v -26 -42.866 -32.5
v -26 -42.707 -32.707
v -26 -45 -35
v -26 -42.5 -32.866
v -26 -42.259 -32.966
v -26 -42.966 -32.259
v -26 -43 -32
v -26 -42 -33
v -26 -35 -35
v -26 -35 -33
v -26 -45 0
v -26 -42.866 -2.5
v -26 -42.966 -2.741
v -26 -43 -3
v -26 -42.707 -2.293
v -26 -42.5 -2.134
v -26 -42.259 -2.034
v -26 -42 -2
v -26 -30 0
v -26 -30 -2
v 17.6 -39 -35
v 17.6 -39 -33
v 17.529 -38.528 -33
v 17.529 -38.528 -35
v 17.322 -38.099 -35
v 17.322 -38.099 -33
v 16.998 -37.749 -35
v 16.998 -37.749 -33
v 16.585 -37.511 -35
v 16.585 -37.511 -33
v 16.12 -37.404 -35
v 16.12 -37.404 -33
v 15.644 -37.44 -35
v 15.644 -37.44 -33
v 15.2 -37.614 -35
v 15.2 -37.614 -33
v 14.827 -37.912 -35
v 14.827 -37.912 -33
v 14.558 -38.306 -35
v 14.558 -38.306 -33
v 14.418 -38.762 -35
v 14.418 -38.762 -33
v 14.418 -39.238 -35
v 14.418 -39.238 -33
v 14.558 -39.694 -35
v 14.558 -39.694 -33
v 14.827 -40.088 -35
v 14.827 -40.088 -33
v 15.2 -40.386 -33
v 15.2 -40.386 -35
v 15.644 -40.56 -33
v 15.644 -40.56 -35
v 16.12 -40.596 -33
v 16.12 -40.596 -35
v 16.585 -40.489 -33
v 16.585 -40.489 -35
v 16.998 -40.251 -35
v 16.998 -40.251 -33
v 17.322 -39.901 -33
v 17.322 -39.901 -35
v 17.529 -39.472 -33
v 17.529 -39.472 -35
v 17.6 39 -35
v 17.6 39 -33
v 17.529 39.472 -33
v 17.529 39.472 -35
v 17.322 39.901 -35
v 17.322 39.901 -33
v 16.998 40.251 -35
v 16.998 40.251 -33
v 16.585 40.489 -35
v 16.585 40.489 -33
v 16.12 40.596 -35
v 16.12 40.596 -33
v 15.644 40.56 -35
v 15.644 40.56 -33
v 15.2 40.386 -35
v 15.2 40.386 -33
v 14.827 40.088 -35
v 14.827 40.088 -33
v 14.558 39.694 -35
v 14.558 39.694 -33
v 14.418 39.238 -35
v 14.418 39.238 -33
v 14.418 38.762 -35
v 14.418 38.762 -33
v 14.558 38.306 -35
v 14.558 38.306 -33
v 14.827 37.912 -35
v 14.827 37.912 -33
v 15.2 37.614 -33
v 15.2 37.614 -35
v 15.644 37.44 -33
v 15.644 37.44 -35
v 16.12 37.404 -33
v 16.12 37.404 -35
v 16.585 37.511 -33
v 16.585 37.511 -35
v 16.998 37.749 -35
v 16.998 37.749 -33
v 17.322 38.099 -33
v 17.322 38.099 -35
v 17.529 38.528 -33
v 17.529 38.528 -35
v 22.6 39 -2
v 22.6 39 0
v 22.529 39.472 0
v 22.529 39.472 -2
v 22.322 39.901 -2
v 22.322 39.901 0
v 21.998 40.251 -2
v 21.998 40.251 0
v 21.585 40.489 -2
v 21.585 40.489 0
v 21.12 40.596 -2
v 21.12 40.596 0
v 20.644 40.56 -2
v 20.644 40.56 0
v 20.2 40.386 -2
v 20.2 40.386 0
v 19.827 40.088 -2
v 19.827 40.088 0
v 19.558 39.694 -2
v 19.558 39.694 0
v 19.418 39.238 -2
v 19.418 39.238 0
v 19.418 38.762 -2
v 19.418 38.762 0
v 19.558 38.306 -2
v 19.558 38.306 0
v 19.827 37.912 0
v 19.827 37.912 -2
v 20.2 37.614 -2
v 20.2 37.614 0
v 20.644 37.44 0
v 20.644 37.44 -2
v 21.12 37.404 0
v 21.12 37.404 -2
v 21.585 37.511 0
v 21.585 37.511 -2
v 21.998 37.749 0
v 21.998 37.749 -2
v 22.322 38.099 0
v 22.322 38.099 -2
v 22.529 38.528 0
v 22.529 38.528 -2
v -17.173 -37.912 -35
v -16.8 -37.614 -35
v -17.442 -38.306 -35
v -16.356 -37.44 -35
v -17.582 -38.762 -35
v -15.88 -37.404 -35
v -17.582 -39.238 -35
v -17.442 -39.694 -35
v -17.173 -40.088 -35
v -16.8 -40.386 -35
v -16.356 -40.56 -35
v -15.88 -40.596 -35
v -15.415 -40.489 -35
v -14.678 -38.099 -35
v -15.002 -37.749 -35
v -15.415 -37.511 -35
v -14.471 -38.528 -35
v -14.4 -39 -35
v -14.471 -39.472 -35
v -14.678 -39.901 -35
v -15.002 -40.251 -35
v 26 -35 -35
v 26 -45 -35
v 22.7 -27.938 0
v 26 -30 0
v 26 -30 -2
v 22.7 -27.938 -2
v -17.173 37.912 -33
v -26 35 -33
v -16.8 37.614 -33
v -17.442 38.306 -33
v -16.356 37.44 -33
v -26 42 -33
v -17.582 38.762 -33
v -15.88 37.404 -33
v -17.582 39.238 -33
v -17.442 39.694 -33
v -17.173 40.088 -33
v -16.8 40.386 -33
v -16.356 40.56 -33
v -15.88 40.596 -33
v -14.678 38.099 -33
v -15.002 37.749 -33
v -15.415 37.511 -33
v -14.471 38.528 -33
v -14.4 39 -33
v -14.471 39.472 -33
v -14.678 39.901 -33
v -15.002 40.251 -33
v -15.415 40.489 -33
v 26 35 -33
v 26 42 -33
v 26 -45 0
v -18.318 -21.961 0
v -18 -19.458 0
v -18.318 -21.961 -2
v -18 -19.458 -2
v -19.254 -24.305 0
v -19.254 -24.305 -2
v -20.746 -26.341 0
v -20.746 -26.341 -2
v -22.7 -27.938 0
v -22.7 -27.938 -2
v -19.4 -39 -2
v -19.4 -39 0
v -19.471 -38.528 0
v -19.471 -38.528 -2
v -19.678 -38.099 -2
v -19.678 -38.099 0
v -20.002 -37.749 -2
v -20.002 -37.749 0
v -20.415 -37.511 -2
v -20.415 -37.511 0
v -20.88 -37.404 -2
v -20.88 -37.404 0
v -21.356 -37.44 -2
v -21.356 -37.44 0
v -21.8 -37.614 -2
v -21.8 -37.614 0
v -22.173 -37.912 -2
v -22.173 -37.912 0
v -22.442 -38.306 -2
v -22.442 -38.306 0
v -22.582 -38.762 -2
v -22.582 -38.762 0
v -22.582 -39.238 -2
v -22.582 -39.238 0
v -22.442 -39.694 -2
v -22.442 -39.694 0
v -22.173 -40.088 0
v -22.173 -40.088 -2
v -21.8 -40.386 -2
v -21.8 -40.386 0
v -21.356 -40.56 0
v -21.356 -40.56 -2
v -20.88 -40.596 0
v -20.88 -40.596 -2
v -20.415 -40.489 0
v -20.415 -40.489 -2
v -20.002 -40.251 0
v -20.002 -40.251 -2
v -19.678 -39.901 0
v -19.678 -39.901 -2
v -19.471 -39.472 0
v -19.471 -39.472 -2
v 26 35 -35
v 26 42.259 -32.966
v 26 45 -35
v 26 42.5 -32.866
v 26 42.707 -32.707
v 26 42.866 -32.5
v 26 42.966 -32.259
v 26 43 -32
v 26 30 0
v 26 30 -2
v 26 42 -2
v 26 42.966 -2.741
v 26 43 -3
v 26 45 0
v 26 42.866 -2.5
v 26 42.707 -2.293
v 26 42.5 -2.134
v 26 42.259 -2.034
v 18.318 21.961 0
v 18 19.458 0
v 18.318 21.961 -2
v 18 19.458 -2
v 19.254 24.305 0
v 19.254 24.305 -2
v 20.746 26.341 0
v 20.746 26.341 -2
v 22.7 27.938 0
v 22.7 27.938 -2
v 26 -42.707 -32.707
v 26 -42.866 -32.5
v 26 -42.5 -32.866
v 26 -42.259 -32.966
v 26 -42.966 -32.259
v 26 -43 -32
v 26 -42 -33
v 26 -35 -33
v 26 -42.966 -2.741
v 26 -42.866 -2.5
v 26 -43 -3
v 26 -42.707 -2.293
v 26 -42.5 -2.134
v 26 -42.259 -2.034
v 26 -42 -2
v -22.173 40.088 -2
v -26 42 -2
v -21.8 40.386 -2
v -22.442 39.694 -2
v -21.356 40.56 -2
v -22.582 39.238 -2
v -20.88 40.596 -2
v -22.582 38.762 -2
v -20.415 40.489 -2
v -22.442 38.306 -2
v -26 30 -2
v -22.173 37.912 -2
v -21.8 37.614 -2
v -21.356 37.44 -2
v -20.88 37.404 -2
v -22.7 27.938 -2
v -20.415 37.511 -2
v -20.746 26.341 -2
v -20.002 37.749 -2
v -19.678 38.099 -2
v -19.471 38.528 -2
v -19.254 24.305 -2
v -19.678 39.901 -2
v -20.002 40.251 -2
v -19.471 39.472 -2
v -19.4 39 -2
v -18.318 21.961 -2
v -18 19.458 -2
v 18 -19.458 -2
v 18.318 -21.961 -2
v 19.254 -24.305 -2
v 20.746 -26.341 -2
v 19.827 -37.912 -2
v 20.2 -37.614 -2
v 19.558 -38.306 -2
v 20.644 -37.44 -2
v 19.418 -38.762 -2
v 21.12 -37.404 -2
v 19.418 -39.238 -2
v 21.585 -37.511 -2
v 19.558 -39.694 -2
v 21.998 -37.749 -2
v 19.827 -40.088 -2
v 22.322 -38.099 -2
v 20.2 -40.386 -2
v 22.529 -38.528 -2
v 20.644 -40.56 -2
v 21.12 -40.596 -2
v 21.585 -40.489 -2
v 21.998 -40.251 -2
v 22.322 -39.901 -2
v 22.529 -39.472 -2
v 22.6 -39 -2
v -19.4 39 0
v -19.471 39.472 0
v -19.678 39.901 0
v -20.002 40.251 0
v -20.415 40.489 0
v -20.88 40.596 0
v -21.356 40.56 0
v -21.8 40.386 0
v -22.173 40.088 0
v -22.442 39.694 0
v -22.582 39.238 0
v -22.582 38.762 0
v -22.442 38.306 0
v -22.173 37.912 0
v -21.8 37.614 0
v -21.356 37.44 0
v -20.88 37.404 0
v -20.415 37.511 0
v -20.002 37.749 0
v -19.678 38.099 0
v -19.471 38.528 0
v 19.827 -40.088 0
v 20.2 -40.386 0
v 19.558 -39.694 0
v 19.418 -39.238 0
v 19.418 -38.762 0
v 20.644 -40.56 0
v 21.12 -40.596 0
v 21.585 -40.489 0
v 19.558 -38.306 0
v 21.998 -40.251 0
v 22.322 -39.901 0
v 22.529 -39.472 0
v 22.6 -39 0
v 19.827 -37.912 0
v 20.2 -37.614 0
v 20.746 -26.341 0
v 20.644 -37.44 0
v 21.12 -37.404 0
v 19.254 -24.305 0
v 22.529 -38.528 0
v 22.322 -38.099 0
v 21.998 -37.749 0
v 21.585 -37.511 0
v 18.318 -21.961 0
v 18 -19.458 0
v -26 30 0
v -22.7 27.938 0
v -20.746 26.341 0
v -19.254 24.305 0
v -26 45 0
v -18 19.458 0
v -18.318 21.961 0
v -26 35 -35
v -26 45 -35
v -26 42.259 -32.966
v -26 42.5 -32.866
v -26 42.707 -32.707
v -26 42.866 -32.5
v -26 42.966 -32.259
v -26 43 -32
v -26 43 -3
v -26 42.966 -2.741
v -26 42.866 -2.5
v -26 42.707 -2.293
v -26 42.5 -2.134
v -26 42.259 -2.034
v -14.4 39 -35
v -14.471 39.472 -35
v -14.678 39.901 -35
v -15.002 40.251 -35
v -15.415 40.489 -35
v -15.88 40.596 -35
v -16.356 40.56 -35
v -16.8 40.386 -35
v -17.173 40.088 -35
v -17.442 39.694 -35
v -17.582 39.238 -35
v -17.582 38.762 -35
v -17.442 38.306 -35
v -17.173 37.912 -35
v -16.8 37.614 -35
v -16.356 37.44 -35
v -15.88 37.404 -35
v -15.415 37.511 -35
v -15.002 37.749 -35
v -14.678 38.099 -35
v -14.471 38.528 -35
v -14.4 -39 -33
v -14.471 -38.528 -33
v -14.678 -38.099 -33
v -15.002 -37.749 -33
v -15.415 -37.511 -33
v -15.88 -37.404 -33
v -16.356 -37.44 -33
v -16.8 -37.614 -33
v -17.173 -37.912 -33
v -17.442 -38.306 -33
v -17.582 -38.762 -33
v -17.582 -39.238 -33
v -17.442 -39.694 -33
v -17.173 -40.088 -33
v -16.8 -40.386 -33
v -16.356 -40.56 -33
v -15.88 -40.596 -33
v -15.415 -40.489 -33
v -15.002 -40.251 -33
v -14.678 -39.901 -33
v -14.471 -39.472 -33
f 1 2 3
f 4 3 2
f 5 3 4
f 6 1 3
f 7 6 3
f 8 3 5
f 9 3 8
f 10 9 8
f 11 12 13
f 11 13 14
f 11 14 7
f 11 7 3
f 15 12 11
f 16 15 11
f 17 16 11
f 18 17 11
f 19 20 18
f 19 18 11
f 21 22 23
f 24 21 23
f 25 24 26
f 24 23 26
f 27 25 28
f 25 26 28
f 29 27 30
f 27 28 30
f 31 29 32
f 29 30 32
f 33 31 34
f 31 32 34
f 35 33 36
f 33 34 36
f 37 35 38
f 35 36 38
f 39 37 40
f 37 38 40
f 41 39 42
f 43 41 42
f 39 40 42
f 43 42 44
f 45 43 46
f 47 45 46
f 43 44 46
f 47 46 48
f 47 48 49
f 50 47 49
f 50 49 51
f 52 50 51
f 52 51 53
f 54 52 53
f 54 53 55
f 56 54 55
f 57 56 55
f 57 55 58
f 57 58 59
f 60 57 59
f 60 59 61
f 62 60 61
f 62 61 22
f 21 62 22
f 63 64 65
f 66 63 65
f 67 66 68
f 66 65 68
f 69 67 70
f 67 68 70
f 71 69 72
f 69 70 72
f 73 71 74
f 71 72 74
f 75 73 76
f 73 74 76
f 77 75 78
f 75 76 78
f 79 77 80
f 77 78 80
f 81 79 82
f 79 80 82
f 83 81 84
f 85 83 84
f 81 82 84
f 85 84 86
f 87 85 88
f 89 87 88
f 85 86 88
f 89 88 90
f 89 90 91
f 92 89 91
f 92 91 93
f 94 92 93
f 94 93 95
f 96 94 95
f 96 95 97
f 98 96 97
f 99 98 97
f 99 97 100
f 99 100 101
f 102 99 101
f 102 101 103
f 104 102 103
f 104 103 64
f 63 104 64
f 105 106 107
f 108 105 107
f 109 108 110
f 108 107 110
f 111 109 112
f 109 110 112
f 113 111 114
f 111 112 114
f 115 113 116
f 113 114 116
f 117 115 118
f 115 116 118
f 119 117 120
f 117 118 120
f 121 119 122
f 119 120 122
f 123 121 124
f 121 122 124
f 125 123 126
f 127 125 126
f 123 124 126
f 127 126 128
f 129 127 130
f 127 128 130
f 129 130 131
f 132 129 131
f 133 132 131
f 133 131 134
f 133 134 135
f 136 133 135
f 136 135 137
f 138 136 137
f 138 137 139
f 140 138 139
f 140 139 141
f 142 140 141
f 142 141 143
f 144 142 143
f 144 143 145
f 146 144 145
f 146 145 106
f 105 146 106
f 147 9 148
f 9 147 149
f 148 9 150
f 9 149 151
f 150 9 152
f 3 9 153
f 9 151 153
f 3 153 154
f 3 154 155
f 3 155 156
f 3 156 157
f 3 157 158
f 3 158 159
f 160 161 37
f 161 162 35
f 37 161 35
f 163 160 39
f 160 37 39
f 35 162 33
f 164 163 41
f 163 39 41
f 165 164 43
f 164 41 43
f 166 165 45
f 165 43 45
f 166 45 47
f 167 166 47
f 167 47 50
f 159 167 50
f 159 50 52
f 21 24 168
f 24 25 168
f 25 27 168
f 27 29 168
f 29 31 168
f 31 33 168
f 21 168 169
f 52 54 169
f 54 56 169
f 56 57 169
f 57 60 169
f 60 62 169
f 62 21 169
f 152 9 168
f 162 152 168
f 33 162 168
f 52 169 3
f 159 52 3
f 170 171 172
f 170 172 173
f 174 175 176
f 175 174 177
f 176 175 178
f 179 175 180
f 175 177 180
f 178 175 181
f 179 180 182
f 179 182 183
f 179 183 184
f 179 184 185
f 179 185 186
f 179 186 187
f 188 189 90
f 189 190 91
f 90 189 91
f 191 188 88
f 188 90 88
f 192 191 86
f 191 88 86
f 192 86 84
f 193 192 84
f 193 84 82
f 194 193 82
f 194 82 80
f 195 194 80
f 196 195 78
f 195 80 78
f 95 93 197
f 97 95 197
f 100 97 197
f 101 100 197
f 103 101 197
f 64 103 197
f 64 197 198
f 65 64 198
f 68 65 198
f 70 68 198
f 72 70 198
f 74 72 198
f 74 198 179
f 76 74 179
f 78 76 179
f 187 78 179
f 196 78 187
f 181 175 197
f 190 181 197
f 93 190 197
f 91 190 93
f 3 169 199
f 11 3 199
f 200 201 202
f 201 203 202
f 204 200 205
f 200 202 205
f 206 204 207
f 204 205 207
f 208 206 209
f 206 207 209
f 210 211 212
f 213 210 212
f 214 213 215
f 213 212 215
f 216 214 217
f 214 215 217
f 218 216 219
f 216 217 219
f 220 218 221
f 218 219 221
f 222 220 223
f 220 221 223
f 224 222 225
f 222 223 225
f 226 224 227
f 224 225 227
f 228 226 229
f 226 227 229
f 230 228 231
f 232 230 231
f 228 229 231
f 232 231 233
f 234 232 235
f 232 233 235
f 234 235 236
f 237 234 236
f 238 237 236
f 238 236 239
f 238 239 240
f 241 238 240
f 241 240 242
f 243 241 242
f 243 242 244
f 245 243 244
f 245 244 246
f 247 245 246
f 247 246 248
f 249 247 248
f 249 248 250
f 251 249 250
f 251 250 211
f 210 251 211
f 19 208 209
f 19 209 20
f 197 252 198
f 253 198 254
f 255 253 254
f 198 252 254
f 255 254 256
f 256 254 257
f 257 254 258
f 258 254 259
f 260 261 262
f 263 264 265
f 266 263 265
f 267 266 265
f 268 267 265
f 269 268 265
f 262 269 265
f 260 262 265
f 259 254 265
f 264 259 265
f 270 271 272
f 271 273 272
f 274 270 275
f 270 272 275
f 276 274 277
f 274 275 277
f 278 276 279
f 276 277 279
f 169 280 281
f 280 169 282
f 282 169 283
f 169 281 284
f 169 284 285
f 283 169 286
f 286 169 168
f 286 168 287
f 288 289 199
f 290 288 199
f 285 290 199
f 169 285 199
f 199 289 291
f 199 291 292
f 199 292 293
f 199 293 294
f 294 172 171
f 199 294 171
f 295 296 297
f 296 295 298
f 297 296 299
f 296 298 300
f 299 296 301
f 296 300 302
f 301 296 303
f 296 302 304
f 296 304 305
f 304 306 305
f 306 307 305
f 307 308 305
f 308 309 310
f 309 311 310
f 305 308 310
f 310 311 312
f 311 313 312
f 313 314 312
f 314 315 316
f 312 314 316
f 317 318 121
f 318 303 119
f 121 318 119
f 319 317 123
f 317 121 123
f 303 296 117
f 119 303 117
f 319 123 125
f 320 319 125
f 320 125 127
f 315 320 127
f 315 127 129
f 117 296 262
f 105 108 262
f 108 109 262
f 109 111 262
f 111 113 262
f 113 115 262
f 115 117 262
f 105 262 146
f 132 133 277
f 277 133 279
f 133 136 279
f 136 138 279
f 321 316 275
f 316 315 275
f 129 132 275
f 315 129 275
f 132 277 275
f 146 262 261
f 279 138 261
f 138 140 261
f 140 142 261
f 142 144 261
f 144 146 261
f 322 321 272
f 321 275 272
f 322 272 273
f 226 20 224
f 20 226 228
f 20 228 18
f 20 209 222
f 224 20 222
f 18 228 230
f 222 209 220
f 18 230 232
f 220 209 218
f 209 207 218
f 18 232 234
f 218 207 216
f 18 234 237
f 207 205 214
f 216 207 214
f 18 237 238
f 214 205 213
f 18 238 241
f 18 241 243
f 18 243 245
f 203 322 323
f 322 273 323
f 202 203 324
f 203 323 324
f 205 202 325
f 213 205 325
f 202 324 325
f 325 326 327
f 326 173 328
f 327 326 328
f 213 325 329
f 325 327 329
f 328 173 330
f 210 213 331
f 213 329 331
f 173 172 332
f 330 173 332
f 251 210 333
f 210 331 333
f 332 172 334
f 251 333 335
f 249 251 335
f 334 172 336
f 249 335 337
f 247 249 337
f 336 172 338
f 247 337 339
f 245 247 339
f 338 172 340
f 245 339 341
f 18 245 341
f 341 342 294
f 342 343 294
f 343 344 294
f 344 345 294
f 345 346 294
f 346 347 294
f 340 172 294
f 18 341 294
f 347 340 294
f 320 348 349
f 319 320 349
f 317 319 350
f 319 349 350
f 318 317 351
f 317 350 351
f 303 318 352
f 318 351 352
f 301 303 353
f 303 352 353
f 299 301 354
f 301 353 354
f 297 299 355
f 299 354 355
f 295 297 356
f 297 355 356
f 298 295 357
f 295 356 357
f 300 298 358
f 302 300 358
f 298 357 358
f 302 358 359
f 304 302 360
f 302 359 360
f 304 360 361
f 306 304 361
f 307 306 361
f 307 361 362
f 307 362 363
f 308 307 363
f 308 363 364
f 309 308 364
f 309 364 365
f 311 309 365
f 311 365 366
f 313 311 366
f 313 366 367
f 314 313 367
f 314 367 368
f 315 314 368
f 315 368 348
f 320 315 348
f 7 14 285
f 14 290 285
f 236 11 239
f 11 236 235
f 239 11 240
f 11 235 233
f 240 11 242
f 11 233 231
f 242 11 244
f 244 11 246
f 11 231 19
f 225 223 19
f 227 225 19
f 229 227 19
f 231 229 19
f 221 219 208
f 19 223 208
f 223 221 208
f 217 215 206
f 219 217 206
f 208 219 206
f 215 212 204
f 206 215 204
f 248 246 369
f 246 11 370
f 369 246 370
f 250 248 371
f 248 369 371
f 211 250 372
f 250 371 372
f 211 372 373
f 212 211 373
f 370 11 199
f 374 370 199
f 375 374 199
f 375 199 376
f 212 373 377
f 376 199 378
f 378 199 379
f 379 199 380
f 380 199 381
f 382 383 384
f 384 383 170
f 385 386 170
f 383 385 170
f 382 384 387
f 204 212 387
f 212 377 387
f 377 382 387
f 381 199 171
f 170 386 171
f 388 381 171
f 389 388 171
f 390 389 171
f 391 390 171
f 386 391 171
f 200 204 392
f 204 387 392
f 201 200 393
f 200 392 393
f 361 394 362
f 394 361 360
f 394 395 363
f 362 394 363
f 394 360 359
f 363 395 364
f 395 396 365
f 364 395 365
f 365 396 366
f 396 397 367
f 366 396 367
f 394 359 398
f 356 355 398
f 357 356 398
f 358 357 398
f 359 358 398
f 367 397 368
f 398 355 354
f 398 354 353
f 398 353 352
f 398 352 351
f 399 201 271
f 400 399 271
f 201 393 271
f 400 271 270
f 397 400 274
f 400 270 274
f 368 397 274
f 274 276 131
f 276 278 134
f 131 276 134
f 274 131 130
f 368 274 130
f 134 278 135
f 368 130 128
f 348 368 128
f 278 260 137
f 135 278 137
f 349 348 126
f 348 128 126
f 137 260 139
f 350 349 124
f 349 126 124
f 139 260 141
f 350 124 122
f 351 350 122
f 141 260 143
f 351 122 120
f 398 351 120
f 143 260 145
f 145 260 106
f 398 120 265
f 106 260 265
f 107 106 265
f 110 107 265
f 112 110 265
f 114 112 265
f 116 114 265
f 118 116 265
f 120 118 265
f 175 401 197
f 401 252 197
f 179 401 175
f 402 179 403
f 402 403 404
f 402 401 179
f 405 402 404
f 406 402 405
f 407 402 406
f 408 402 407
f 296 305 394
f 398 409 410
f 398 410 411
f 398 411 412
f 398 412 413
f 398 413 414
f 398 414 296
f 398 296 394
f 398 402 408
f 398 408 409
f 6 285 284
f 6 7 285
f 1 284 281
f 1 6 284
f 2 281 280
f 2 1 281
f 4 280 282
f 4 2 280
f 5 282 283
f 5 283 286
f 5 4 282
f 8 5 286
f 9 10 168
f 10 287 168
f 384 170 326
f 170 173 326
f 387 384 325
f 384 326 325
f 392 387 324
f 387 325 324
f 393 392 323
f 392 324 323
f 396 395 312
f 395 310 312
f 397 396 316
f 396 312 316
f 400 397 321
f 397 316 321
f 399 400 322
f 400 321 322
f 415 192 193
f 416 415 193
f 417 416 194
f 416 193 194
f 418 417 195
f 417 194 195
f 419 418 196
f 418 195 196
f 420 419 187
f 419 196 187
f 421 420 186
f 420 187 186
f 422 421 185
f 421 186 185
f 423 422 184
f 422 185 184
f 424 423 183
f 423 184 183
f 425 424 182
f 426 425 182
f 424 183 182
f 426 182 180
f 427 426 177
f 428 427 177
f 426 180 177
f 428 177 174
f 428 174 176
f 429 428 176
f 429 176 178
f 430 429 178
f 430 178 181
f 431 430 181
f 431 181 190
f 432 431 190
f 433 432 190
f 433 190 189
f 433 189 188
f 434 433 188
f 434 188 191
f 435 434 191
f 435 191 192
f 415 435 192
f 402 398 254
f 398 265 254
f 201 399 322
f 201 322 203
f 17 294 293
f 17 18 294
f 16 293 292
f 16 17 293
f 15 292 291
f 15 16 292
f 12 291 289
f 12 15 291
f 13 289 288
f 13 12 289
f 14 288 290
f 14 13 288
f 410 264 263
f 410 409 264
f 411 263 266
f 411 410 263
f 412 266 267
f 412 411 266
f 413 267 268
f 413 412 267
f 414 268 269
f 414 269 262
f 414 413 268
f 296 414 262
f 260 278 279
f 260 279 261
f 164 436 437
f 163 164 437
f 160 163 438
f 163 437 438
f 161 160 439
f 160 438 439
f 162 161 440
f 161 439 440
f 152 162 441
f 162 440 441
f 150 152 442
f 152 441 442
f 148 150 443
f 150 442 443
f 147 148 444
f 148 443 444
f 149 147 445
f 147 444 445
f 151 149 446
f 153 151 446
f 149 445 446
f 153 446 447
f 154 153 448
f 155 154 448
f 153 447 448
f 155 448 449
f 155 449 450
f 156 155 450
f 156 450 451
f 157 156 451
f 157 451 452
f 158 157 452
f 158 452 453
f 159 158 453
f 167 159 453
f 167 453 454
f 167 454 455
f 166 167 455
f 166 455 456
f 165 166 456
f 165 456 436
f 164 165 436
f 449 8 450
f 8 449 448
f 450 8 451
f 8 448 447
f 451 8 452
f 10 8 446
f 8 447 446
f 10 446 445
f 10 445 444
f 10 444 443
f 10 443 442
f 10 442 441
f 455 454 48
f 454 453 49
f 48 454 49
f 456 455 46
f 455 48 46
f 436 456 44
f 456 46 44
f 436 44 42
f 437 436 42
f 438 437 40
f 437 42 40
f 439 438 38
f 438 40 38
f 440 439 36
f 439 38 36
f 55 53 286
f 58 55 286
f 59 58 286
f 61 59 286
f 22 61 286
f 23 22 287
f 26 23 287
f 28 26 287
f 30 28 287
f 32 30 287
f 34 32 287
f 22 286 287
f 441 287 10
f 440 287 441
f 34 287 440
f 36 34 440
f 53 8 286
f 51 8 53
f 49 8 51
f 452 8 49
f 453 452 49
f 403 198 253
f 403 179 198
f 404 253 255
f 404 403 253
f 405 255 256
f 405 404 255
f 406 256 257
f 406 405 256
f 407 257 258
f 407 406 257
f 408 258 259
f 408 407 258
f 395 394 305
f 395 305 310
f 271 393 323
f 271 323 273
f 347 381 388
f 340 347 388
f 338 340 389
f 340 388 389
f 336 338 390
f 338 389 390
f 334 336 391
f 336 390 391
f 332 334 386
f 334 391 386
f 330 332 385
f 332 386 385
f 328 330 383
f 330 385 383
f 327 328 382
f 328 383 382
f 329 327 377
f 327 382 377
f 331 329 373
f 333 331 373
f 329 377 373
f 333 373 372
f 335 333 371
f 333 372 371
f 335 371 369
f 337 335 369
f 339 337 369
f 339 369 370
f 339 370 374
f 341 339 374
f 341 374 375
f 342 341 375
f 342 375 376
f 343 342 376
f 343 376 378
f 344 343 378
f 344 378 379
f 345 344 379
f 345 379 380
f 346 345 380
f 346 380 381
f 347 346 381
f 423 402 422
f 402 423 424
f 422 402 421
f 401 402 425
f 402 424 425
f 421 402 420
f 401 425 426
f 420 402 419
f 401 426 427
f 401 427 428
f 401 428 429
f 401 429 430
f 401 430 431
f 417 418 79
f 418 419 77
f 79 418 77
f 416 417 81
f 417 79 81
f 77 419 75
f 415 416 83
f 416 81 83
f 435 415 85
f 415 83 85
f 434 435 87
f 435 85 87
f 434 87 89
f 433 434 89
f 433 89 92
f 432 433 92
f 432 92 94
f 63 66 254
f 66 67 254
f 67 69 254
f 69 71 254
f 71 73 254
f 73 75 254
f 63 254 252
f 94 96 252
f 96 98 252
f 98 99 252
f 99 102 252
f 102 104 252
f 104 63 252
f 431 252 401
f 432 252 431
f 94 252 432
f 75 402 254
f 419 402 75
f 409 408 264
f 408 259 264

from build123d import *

# Parameters (mm, degrees)
BOSS_EXTRUDE1_DEPTH = 26
CUT_EXTRUDE1_REACH  = 64.658
SKETCH2_R           = 1.6
CUT_EXTRUDE5_REACH  = 63.563
SKETCH6_R           = 1.6
FILLET1_R           = 1
CUT_EXTRUDE6_REACH  = 64.658
FILLET2_R           = 10


with BuildPart() as part:
    # Sketch1 → Boss-Extrude1 (new, symmetric)
    with BuildSketch(Plane(origin=(0, 0, 0), x_dir=(0, 0, -1), z_dir=(1, 0, 0))):
        Polygon((0, -45), (0, 45), (35, 45), (35, 35), (33, 35), (33, 43), (2, 43), (2, -43), (33, -43), (33, -35), (35, -35), (35, -45), align=None)
    extrude(amount=BOSS_EXTRUDE1_DEPTH, both=True)

    # Sketch2 → Cut-Extrude1 (cut, up to next)
    with BuildSketch(Plane.XY, mode=Mode.PRIVATE) as cut_extrude1_sk1:
        with Locations((-21, -39)):
            Circle(SKETCH2_R)
    cut_extrude1_tool1 = extrude(cut_extrude1_sk1.sketch, amount=-CUT_EXTRUDE1_REACH, mode=Mode.PRIVATE) & part.part
    # Sketch2 → Cut-Extrude1 (cut, up to next)
    with BuildSketch(Plane.XY, mode=Mode.PRIVATE) as cut_extrude1_sk2:
        with Locations((-21, 39)):
            Circle(SKETCH2_R)
    cut_extrude1_tool2 = extrude(cut_extrude1_sk2.sketch, amount=-CUT_EXTRUDE1_REACH, mode=Mode.PRIVATE) & part.part
    # Sketch2 → Cut-Extrude1 (cut, up to next)
    with BuildSketch(Plane.XY, mode=Mode.PRIVATE) as cut_extrude1_sk3:
        with Locations((21, 39)):
            Circle(SKETCH2_R)
    cut_extrude1_tool3 = extrude(cut_extrude1_sk3.sketch, amount=-CUT_EXTRUDE1_REACH, mode=Mode.PRIVATE) & part.part
    # Sketch2 → Cut-Extrude1 (cut, up to next)
    with BuildSketch(Plane.XY, mode=Mode.PRIVATE) as cut_extrude1_sk4:
        with Locations((21, -39)):
            Circle(SKETCH2_R)
    cut_extrude1_tool4 = extrude(cut_extrude1_sk4.sketch, amount=-CUT_EXTRUDE1_REACH, mode=Mode.PRIVATE) & part.part
    add(cut_extrude1_tool1.solids().sort_by_distance((-21, -39, 0))[0], mode=Mode.SUBTRACT)
    add(cut_extrude1_tool2.solids().sort_by_distance((-21, 39, 0))[0], mode=Mode.SUBTRACT)
    add(cut_extrude1_tool3.solids().sort_by_distance((21, 39, 0))[0], mode=Mode.SUBTRACT)
    add(cut_extrude1_tool4.solids().sort_by_distance((21, -39, 0))[0], mode=Mode.SUBTRACT)

    # Sketch6 → Cut-Extrude5 (cut, up to next)
    with BuildSketch(Plane.XY.offset(-33), mode=Mode.PRIVATE) as cut_extrude5_sk1:
        with Locations((16, -39)):
            Circle(SKETCH6_R)
    cut_extrude5_tool1 = extrude(cut_extrude5_sk1.sketch, amount=-CUT_EXTRUDE5_REACH, mode=Mode.PRIVATE) & part.part
    # Sketch6 → Cut-Extrude5 (cut, up to next)
    with BuildSketch(Plane.XY.offset(-33), mode=Mode.PRIVATE) as cut_extrude5_sk2:
        with Locations((-16, -39)):
            Circle(SKETCH6_R)
    cut_extrude5_tool2 = extrude(cut_extrude5_sk2.sketch, amount=-CUT_EXTRUDE5_REACH, mode=Mode.PRIVATE) & part.part
    # Sketch6 → Cut-Extrude5 (cut, up to next)
    with BuildSketch(Plane.XY.offset(-33), mode=Mode.PRIVATE) as cut_extrude5_sk3:
        with Locations((-16, 39)):
            Circle(SKETCH6_R)
    cut_extrude5_tool3 = extrude(cut_extrude5_sk3.sketch, amount=-CUT_EXTRUDE5_REACH, mode=Mode.PRIVATE) & part.part
    # Sketch6 → Cut-Extrude5 (cut, up to next)
    with BuildSketch(Plane.XY.offset(-33), mode=Mode.PRIVATE) as cut_extrude5_sk4:
        with Locations((16, 39)):
            Circle(SKETCH6_R)
    cut_extrude5_tool4 = extrude(cut_extrude5_sk4.sketch, amount=-CUT_EXTRUDE5_REACH, mode=Mode.PRIVATE) & part.part
    add(cut_extrude5_tool1.solids().sort_by_distance((16, -39, -33))[0], mode=Mode.SUBTRACT)
    add(cut_extrude5_tool2.solids().sort_by_distance((-16, -39, -33))[0], mode=Mode.SUBTRACT)
    add(cut_extrude5_tool3.solids().sort_by_distance((-16, 39, -33))[0], mode=Mode.SUBTRACT)
    add(cut_extrude5_tool4.solids().sort_by_distance((16, 39, -33))[0], mode=Mode.SUBTRACT)

    # Fillet1
    fillet1_edges = [part.edges().sort_by_distance(p)[0] for p in [
        (0, 43, -33),
        (0, 43, -2),
        (0, -43, -2),
        (0, -43, -33),
    ]]
    fillet(fillet1_edges, radius=FILLET1_R)

    # Sketch7 → Cut-Extrude6 (cut, up to next)
    with BuildSketch(Plane.XY, mode=Mode.PRIVATE) as cut_extrude6_sk1:
        Polygon((-26, 30), (-18, 25), (-18, -25), (-26, -30), align=None)
    cut_extrude6_tool1 = extrude(cut_extrude6_sk1.sketch, amount=-CUT_EXTRUDE6_REACH, mode=Mode.PRIVATE) & part.part
    # Sketch7 → Cut-Extrude6 (cut, up to next)
    with BuildSketch(Plane.XY, mode=Mode.PRIVATE) as cut_extrude6_sk2:
        Polygon((26, -30), (18, -25), (18, 25), (26, 30), align=None)
    cut_extrude6_tool2 = extrude(cut_extrude6_sk2.sketch, amount=-CUT_EXTRUDE6_REACH, mode=Mode.PRIVATE) & part.part
    add(cut_extrude6_tool1.solids().sort_by_distance((-22.121212, 0, 0))[0], mode=Mode.SUBTRACT)
    add(cut_extrude6_tool2.solids().sort_by_distance((22.121212, 0, 0))[0], mode=Mode.SUBTRACT)

    # Fillet2
    fillet2_edges = [part.edges().sort_by_distance(p)[0] for p in [
        (18, -25, -1),
        (18, 25, -1),
        (-18, 25, -1),
        (-18, -25, -1),
    ]]
    fillet(fillet2_edges, radius=FILLET2_R)


solid = part.part
